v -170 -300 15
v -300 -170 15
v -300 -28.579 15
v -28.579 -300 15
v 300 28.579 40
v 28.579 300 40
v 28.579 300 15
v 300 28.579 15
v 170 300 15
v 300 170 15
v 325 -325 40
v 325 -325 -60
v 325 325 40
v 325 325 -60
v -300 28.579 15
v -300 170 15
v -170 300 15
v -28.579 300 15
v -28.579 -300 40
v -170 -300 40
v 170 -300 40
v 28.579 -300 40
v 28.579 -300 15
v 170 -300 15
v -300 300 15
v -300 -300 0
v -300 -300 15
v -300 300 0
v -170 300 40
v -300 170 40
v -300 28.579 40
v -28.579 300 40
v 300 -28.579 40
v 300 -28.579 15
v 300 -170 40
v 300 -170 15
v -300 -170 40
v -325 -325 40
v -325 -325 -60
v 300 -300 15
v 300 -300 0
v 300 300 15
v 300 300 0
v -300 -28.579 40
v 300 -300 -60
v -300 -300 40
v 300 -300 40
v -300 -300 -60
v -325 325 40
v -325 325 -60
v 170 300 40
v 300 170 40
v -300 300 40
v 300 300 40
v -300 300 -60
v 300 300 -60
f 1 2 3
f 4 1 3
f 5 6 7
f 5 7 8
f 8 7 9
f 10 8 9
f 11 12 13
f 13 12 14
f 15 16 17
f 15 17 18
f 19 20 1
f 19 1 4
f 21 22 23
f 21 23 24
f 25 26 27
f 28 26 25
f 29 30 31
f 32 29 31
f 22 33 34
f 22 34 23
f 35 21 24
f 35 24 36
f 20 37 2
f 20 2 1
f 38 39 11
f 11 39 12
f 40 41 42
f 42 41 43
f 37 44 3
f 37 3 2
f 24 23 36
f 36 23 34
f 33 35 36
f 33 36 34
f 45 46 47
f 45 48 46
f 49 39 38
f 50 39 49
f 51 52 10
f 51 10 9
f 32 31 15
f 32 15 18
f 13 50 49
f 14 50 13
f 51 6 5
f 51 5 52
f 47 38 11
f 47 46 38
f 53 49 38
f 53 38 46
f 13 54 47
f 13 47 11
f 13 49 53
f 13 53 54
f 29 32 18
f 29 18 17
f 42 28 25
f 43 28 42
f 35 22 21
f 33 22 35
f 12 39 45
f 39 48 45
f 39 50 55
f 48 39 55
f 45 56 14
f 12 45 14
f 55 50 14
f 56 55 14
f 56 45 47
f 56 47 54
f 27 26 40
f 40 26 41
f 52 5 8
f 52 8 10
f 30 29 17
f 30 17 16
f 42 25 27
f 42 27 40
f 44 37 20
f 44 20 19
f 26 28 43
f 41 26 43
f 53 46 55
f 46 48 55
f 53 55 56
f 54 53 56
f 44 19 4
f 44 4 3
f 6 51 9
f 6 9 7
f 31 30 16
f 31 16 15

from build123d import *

# Parameters (mm, degrees)
F0_W          = 600
F0_H          = 600
F1_DEPTH      = 15
F3_W          = 650
F3_H          = 650
F3_W_2        = 600
F3_H_2        = 600
F4_DEPTH      = 75
F4_DEPTH_BACK = 25
F6_DEPTH      = 25


with BuildPart() as f1:
    # F0 (on Top) → F1 (new body)
    with BuildSketch(Plane.XY):
        Rectangle(F0_W, F0_H)
    extrude(amount=F1_DEPTH)


with BuildPart() as f4:
    # F3 (on face) → F4 (new body, two sides)
    with BuildSketch(Plane.XY.offset(15)) as f4_sk:
        Rectangle(F3_W, F3_H)
        Rectangle(F3_W_2, F3_H_2, mode=Mode.SUBTRACT)
    extrude(amount=-F4_DEPTH)
    extrude(f4_sk.sketch, amount=F4_DEPTH_BACK)


with BuildPart() as f6:
    # F5 (on face) → F6 (new body)
    with BuildSketch(Plane.XY.offset(40)):
        Polygon((-28.5786437627, 300), (-170, 300), (-300, 170), (-300, 28.5786437627), align=None)
    extrude(amount=-F6_DEPTH)


with BuildPart() as f6b:
    # F5 (on face) → F6, piece 2 (new body)
    with BuildSketch(Plane.XY.offset(40)):
        Polygon((300, 170), (170, 300), (28.5786437627, 300), (300, 28.5786437627), align=None)
    extrude(amount=-F6_DEPTH)


with BuildPart() as f6c:
    # F5 (on face) → F6, piece 3 (new body)
    with BuildSketch(Plane.XY.offset(40)):
        Polygon((170, -300), (300, -170), (300, -28.5786437627), (28.5786437627, -300), align=None)
    extrude(amount=-F6_DEPTH)


with BuildPart() as f6d:
    # F5 (on face) → F6, piece 4 (new body)
    with BuildSketch(Plane.XY.offset(40)):
        Polygon((-28.5786437627, -300), (-300, -28.5786437627), (-300, -170), (-170, -300), align=None)
    extrude(amount=-F6_DEPTH)


solid = Compound([f1.part, f4.part, f6.part, f6b.part, f6c.part, f6d.part])
